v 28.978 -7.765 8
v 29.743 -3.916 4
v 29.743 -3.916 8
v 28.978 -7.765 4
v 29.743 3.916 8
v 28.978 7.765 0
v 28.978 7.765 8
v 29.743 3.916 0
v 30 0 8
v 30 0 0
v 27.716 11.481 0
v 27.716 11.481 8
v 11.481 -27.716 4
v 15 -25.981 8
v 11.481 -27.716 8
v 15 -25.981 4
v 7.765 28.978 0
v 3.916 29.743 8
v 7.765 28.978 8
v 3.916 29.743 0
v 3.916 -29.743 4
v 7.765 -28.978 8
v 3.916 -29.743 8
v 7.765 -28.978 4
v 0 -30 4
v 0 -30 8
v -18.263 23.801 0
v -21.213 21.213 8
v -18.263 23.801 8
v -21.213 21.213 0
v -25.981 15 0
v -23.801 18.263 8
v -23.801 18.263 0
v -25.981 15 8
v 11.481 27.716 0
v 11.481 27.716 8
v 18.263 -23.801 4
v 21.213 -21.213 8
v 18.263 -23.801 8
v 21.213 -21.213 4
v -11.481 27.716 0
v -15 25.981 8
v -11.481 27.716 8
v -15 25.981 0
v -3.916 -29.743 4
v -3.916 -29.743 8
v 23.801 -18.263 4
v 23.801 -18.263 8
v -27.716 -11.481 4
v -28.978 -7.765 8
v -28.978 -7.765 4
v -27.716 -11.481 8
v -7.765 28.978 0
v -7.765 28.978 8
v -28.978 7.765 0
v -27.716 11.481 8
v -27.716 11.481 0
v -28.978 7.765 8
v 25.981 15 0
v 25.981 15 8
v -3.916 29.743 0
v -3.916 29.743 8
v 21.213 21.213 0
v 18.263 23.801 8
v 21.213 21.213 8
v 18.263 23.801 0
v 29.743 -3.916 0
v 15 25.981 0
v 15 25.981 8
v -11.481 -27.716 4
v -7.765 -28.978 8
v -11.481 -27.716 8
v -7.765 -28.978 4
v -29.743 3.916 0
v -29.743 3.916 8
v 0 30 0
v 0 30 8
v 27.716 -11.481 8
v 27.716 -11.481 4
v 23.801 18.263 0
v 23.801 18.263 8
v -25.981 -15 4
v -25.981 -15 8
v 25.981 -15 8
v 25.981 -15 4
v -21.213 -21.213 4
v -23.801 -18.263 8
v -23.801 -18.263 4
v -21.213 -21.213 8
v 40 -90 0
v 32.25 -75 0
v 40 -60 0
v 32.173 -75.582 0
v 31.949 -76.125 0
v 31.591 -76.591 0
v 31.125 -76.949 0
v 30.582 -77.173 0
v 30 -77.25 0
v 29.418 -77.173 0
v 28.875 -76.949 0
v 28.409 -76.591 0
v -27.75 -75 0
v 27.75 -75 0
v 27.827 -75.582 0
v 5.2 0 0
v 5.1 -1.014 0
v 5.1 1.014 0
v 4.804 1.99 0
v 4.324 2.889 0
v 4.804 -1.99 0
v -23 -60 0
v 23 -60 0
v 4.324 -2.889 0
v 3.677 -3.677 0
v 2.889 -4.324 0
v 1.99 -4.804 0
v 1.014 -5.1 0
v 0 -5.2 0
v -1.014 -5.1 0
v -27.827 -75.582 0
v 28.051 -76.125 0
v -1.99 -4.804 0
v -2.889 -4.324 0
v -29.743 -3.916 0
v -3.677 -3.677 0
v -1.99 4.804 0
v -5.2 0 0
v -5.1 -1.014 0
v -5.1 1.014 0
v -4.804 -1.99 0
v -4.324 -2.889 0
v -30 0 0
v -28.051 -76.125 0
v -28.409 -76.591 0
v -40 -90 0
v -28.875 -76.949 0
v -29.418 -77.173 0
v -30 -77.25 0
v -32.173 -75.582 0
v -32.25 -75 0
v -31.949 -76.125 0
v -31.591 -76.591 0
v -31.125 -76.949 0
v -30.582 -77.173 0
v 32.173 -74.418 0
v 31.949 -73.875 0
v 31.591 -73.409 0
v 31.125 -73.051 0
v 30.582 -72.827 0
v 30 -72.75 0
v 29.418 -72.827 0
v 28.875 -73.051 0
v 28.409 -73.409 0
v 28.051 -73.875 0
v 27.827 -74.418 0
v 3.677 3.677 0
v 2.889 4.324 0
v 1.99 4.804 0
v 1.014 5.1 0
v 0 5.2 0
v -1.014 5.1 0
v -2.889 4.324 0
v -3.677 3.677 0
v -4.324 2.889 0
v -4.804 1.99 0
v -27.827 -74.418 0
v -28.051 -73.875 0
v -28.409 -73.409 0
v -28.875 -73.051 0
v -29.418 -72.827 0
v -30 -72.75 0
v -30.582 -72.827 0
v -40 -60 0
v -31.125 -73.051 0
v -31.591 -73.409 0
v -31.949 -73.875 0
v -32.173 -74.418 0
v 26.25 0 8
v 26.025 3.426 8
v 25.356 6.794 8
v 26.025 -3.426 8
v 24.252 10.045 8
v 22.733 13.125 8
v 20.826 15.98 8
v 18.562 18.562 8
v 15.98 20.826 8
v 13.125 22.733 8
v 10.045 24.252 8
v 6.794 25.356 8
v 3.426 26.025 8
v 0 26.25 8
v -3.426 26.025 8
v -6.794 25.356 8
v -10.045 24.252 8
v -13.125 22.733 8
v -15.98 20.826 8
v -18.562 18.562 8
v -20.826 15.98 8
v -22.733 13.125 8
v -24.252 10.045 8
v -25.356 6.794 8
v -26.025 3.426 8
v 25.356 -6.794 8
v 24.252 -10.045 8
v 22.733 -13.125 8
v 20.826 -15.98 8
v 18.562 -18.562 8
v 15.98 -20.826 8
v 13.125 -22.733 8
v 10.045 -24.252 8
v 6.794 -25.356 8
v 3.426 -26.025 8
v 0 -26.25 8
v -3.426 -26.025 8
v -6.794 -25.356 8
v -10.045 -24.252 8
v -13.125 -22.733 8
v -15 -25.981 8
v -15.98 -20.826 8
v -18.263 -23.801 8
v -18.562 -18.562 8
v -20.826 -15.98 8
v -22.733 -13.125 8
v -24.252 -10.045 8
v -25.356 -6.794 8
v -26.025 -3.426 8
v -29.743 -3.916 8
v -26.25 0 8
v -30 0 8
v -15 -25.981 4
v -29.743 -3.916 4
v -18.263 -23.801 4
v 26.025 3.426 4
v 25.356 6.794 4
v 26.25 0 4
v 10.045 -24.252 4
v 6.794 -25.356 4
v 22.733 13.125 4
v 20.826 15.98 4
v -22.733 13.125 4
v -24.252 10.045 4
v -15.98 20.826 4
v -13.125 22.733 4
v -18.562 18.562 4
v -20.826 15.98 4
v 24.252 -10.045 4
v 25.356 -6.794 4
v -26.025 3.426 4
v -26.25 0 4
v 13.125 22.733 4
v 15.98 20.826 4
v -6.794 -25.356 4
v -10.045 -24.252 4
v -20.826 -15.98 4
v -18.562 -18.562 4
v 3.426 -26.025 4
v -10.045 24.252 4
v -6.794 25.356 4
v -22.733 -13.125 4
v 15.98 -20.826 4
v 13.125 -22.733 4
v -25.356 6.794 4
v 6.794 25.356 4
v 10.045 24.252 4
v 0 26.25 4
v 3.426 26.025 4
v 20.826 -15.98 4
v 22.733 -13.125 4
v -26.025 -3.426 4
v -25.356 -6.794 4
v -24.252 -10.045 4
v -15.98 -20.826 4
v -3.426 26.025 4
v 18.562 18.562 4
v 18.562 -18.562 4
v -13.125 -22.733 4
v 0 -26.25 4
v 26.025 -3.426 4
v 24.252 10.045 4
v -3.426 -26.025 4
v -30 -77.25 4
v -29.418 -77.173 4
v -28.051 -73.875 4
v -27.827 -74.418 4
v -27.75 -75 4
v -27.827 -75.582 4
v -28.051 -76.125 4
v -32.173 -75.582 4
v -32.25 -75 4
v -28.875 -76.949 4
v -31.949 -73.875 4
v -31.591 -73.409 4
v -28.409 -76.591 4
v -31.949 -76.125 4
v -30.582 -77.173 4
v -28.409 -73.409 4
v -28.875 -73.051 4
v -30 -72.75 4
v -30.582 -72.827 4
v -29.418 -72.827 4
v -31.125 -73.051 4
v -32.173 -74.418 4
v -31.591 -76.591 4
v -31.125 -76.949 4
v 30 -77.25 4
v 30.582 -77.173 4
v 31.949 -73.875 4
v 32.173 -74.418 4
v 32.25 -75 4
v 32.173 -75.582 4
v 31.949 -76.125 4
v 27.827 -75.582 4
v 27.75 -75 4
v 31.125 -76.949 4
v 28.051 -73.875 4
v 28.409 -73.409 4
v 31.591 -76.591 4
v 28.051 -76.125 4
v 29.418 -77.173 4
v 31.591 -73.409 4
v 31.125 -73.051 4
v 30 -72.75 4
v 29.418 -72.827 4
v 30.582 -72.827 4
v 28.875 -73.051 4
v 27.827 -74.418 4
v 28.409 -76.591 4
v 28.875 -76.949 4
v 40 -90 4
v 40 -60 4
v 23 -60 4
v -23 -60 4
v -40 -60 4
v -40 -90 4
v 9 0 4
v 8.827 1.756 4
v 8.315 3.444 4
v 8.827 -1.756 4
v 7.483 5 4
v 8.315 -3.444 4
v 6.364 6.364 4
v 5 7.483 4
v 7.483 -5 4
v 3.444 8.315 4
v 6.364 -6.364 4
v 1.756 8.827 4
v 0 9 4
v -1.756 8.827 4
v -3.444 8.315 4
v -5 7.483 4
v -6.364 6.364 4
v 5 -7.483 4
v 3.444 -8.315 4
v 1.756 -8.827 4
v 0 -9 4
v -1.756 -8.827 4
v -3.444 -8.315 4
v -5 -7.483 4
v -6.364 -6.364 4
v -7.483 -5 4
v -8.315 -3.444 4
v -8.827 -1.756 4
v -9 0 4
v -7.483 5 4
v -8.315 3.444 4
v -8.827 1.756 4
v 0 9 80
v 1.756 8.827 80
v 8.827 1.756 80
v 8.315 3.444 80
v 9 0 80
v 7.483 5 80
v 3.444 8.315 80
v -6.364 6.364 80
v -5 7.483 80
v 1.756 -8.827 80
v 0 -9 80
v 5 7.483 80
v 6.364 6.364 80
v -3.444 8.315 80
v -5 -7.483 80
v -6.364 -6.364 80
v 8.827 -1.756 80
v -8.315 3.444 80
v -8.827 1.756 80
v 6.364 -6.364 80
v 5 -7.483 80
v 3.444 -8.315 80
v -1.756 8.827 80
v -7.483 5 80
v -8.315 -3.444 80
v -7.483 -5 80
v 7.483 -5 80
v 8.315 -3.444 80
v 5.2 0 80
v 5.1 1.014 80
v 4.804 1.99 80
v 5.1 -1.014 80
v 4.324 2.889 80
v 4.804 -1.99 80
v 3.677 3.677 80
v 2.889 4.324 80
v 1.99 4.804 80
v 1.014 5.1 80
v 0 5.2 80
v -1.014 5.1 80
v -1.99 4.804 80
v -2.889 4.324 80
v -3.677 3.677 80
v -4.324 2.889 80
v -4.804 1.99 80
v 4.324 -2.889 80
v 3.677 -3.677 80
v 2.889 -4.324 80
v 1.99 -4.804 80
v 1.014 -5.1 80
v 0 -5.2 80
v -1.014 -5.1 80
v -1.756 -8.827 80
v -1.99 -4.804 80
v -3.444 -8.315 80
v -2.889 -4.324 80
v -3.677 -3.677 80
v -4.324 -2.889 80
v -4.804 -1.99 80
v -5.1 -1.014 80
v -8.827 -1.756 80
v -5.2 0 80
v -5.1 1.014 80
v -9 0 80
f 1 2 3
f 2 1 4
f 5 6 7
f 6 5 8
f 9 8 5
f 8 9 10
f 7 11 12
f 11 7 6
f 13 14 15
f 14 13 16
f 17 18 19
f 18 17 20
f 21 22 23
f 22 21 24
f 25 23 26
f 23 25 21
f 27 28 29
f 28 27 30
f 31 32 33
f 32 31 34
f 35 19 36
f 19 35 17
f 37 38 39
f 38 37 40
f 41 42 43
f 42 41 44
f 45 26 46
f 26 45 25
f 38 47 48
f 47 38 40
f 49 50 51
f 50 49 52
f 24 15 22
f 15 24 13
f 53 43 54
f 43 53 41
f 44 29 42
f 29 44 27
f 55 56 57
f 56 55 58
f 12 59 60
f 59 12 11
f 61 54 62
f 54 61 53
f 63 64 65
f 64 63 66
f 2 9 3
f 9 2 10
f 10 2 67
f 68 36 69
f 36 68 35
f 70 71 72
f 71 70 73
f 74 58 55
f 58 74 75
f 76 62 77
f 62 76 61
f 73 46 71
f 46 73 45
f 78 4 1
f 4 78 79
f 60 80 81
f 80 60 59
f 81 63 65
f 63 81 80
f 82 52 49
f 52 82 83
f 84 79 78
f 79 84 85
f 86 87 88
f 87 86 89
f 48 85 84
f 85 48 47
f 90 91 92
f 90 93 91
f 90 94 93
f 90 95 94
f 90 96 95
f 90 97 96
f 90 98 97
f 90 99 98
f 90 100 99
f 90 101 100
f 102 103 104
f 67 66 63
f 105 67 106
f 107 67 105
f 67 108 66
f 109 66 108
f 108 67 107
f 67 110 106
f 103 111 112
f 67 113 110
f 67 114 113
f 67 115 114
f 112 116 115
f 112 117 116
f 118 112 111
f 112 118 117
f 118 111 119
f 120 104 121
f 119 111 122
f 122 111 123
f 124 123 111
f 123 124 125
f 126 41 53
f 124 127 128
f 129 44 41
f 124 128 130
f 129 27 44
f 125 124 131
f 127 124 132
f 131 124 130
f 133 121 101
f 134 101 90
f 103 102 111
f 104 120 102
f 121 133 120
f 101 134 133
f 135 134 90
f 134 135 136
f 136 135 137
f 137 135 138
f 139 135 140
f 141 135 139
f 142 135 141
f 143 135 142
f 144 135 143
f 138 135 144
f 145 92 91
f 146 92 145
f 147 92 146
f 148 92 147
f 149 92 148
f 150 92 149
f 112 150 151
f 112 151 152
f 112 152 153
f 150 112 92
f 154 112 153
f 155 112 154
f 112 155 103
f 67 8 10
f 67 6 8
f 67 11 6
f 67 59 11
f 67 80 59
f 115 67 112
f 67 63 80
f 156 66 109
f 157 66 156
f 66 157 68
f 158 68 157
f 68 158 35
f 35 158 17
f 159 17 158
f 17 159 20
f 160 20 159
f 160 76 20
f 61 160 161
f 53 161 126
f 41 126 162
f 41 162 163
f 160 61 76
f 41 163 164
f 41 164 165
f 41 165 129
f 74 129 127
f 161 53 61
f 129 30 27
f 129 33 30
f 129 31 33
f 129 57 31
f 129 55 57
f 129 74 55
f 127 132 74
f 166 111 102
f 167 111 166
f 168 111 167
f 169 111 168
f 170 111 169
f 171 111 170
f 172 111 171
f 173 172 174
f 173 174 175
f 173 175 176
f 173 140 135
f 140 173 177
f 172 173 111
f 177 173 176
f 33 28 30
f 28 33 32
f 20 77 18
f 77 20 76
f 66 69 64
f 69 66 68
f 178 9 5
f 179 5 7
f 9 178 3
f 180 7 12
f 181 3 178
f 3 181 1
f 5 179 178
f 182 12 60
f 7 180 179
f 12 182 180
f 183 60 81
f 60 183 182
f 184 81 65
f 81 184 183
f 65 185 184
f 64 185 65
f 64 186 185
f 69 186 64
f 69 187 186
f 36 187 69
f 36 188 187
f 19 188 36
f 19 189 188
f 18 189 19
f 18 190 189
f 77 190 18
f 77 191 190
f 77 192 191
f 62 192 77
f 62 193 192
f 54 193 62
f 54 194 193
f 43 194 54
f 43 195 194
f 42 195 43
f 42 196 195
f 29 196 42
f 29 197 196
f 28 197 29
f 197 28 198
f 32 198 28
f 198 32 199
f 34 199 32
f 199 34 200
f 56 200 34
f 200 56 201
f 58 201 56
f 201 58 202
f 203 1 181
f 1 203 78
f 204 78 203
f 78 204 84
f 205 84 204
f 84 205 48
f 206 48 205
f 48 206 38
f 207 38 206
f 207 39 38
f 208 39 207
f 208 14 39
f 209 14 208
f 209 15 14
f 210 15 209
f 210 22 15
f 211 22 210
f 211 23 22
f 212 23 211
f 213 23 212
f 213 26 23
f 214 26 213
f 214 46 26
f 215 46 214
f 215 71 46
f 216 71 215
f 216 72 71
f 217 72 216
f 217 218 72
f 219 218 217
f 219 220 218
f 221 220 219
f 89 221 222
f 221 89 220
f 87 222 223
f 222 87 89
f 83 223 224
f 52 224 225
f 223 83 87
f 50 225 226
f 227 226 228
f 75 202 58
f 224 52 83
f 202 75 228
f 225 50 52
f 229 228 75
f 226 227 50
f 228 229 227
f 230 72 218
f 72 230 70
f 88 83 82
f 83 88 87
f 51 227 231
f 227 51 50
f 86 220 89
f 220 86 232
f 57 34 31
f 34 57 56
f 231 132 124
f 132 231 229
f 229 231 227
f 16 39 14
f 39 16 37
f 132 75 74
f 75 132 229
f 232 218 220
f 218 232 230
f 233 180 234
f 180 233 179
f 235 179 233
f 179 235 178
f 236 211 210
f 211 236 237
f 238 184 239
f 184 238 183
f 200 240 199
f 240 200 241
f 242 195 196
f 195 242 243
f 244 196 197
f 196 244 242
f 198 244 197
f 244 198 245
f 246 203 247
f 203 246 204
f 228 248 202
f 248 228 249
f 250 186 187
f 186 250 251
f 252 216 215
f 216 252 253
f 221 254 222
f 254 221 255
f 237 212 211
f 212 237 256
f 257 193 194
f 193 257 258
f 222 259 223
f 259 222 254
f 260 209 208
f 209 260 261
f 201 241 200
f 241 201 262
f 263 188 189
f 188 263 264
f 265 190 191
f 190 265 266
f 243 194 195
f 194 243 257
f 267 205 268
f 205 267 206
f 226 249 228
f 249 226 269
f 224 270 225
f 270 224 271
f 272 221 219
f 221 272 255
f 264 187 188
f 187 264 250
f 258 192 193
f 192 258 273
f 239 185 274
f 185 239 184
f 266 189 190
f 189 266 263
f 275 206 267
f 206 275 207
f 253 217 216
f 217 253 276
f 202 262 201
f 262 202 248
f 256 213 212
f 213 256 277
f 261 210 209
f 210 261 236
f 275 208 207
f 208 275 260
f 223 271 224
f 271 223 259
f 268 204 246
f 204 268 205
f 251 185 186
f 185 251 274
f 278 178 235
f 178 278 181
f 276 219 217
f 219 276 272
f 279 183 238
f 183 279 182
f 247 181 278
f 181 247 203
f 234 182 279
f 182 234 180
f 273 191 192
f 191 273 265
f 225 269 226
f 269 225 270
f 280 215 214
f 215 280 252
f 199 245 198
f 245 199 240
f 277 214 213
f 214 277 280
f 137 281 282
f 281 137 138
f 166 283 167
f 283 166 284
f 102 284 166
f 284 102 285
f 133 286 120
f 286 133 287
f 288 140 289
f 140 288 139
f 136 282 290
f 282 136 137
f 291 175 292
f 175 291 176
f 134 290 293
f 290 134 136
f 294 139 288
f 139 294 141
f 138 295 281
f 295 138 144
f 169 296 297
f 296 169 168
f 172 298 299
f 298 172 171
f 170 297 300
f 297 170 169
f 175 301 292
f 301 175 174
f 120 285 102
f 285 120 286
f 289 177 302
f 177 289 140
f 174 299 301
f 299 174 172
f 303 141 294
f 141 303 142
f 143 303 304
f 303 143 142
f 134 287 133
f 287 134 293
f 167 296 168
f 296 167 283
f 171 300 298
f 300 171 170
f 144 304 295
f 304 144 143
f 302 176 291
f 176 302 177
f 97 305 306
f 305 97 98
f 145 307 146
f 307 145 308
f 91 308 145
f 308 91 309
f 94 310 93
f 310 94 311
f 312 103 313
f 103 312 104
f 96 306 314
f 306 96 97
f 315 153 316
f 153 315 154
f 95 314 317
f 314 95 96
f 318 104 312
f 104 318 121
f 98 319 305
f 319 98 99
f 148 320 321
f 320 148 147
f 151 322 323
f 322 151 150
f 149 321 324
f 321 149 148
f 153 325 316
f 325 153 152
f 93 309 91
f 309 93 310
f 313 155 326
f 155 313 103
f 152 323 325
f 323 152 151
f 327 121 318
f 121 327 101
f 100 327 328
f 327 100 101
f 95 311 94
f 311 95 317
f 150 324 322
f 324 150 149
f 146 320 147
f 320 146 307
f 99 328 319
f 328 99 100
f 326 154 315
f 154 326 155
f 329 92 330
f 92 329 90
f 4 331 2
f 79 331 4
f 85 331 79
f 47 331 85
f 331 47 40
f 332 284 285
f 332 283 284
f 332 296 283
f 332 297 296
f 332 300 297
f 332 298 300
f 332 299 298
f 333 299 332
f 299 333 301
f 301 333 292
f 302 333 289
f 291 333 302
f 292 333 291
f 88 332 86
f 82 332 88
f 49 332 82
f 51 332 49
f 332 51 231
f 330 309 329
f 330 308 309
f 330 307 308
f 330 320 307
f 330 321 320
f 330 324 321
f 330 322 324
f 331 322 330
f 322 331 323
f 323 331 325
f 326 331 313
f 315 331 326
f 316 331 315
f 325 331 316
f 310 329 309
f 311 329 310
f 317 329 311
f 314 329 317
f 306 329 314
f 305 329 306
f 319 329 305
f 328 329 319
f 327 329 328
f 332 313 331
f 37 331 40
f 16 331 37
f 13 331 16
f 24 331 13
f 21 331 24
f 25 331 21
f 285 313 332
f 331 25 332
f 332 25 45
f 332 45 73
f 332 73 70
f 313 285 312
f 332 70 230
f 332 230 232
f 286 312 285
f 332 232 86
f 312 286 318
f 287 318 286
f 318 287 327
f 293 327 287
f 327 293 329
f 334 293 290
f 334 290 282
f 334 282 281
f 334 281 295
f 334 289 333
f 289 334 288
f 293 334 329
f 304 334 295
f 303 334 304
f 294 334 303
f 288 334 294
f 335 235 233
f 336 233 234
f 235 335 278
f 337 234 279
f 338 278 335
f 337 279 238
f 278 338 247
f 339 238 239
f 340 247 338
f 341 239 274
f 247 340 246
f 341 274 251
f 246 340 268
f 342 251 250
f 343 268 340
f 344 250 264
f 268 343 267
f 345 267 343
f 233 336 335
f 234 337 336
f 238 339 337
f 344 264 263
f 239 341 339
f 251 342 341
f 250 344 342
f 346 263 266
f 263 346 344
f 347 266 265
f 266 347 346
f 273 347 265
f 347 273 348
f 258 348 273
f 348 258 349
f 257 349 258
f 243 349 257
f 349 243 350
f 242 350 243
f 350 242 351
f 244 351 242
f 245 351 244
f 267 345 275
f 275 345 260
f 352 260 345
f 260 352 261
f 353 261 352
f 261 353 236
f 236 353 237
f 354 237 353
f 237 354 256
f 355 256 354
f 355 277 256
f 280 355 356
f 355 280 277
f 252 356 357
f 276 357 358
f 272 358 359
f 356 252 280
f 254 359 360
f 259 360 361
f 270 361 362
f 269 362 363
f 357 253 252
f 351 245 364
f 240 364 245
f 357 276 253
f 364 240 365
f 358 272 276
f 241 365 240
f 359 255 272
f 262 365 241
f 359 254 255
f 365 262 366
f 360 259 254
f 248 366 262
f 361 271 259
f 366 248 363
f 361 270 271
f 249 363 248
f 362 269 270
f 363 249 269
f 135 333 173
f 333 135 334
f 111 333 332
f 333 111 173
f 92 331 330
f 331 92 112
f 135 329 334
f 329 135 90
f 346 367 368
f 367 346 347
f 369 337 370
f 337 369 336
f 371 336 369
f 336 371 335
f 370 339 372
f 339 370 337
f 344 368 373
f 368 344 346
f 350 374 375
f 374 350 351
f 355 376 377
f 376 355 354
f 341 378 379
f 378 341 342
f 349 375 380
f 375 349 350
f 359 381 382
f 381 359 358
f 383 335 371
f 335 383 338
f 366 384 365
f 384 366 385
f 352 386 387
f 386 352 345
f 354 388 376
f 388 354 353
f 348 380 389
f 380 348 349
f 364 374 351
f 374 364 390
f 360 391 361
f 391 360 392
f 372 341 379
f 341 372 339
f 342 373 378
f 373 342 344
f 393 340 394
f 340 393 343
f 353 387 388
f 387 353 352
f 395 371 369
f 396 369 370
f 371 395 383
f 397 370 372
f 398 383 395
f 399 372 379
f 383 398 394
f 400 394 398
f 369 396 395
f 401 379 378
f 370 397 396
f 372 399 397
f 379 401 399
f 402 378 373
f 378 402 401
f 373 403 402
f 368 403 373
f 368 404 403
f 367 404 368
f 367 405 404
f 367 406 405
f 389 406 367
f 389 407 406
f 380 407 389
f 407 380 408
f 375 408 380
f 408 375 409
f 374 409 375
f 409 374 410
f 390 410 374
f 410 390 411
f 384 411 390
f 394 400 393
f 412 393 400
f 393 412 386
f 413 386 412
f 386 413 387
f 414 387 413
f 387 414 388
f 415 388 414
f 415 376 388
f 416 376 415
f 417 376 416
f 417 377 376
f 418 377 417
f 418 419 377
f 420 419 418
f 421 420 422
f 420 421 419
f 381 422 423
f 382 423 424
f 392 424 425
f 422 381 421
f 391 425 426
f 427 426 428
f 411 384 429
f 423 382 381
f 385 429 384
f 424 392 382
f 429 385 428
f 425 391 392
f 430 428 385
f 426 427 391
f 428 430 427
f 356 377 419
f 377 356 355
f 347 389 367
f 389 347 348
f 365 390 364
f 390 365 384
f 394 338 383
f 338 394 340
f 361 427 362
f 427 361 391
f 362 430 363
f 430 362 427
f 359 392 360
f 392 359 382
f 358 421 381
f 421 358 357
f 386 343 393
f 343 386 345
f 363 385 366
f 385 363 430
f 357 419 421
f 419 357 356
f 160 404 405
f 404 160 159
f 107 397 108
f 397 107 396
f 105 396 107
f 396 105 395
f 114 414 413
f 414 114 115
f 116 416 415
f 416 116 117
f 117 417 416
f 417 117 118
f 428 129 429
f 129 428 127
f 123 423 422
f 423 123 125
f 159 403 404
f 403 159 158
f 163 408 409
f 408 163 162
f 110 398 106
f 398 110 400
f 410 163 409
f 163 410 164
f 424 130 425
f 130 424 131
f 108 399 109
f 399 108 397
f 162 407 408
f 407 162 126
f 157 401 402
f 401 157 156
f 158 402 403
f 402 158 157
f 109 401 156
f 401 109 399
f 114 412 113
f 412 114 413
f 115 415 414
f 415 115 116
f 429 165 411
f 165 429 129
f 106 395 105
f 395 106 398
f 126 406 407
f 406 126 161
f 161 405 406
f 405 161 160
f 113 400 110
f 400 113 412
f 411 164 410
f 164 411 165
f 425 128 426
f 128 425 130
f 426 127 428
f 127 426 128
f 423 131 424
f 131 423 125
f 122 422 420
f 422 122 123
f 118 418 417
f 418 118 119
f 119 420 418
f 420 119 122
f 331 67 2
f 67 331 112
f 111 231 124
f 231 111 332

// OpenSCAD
// ============================================================
// Filament Spool Holder — Wall Mount
// ============================================================
// Mounts a filament spool on the wall or frame of a printer.
// Handles standard 200mm spools (Bambu, Prusa, eSun, etc.)

// ---- PARAMETERS ----
spool_hub_dia  = 52;   // Spool inner hub diameter (Bambu/standard ~52mm)
spool_w        = 68;   // Spool width (most standard spools: 55–70mm)
rod_dia        = 10;   // Steel rod diameter (mm) — standard Prusa: 8mm, use 10mm for heavier
wall_t         = 4;    // Wall thickness
bracket_h      = 60;   // Height of bracket arm
mount_hole_d   = 4.5;  // M4 mounting screw clearance
fillet         = 3;    // Corner rounding

// ---- DERIVED ----
bearing_od = spool_hub_dia + wall_t*2;
rod_r      = rod_dia / 2;

// ---- BRACKET ARM ----
module bracket_arm() {
    hull() {
        cylinder(d=bearing_od, h=wall_t, $fn=48);
        translate([0, -bracket_h, 0])
        hull() {
            for (x = [-20, 20]) translate([x, 0, 0])
                cylinder(r=fillet, h=wall_t, $fn=24);
        }
    }
}

// ---- ROD SOCKET (holds 8–10mm steel rod) ----
module rod_socket() {
    difference() {
        cylinder(d=rod_dia + wall_t*2, h=spool_w + wall_t*2, $fn=32);
        translate([0, 0, -0.1])
            cylinder(d=rod_dia + 0.4, h=spool_w + wall_t*2 + 0.2, $fn=32);
    }
}

// ---- SPOOL BEARING RING ----
module bearing_ring() {
    difference() {
        cylinder(d=bearing_od, h=wall_t*2, $fn=48);
        translate([0, 0, -0.1])
            cylinder(d=spool_hub_dia + 0.5, h=wall_t*2 + 0.2, $fn=48);
    }
}

// ---- WALL PLATE ----
module wall_plate() {
    translate([-40, -bracket_h - 30, 0])
    difference() {
        cube([80, 30, wall_t]);
        for (x = [10, 70])
            translate([x, 15, -0.1]) cylinder(d=mount_hole_d, h=wall_t + 0.2, $fn=24);
    }
}

// ---- ASSEMBLE ----
difference() {
    union() {
        bracket_arm();
        bearing_ring();
        wall_plate();
        // Rod holder at top
        translate([0, 0, wall_t]) rod_socket();
    }
    // Rod center clearance
    translate([0, 0, -0.1]) cylinder(d=rod_dia + 0.4, h=wall_t + 0.2, $fn=32);
}
